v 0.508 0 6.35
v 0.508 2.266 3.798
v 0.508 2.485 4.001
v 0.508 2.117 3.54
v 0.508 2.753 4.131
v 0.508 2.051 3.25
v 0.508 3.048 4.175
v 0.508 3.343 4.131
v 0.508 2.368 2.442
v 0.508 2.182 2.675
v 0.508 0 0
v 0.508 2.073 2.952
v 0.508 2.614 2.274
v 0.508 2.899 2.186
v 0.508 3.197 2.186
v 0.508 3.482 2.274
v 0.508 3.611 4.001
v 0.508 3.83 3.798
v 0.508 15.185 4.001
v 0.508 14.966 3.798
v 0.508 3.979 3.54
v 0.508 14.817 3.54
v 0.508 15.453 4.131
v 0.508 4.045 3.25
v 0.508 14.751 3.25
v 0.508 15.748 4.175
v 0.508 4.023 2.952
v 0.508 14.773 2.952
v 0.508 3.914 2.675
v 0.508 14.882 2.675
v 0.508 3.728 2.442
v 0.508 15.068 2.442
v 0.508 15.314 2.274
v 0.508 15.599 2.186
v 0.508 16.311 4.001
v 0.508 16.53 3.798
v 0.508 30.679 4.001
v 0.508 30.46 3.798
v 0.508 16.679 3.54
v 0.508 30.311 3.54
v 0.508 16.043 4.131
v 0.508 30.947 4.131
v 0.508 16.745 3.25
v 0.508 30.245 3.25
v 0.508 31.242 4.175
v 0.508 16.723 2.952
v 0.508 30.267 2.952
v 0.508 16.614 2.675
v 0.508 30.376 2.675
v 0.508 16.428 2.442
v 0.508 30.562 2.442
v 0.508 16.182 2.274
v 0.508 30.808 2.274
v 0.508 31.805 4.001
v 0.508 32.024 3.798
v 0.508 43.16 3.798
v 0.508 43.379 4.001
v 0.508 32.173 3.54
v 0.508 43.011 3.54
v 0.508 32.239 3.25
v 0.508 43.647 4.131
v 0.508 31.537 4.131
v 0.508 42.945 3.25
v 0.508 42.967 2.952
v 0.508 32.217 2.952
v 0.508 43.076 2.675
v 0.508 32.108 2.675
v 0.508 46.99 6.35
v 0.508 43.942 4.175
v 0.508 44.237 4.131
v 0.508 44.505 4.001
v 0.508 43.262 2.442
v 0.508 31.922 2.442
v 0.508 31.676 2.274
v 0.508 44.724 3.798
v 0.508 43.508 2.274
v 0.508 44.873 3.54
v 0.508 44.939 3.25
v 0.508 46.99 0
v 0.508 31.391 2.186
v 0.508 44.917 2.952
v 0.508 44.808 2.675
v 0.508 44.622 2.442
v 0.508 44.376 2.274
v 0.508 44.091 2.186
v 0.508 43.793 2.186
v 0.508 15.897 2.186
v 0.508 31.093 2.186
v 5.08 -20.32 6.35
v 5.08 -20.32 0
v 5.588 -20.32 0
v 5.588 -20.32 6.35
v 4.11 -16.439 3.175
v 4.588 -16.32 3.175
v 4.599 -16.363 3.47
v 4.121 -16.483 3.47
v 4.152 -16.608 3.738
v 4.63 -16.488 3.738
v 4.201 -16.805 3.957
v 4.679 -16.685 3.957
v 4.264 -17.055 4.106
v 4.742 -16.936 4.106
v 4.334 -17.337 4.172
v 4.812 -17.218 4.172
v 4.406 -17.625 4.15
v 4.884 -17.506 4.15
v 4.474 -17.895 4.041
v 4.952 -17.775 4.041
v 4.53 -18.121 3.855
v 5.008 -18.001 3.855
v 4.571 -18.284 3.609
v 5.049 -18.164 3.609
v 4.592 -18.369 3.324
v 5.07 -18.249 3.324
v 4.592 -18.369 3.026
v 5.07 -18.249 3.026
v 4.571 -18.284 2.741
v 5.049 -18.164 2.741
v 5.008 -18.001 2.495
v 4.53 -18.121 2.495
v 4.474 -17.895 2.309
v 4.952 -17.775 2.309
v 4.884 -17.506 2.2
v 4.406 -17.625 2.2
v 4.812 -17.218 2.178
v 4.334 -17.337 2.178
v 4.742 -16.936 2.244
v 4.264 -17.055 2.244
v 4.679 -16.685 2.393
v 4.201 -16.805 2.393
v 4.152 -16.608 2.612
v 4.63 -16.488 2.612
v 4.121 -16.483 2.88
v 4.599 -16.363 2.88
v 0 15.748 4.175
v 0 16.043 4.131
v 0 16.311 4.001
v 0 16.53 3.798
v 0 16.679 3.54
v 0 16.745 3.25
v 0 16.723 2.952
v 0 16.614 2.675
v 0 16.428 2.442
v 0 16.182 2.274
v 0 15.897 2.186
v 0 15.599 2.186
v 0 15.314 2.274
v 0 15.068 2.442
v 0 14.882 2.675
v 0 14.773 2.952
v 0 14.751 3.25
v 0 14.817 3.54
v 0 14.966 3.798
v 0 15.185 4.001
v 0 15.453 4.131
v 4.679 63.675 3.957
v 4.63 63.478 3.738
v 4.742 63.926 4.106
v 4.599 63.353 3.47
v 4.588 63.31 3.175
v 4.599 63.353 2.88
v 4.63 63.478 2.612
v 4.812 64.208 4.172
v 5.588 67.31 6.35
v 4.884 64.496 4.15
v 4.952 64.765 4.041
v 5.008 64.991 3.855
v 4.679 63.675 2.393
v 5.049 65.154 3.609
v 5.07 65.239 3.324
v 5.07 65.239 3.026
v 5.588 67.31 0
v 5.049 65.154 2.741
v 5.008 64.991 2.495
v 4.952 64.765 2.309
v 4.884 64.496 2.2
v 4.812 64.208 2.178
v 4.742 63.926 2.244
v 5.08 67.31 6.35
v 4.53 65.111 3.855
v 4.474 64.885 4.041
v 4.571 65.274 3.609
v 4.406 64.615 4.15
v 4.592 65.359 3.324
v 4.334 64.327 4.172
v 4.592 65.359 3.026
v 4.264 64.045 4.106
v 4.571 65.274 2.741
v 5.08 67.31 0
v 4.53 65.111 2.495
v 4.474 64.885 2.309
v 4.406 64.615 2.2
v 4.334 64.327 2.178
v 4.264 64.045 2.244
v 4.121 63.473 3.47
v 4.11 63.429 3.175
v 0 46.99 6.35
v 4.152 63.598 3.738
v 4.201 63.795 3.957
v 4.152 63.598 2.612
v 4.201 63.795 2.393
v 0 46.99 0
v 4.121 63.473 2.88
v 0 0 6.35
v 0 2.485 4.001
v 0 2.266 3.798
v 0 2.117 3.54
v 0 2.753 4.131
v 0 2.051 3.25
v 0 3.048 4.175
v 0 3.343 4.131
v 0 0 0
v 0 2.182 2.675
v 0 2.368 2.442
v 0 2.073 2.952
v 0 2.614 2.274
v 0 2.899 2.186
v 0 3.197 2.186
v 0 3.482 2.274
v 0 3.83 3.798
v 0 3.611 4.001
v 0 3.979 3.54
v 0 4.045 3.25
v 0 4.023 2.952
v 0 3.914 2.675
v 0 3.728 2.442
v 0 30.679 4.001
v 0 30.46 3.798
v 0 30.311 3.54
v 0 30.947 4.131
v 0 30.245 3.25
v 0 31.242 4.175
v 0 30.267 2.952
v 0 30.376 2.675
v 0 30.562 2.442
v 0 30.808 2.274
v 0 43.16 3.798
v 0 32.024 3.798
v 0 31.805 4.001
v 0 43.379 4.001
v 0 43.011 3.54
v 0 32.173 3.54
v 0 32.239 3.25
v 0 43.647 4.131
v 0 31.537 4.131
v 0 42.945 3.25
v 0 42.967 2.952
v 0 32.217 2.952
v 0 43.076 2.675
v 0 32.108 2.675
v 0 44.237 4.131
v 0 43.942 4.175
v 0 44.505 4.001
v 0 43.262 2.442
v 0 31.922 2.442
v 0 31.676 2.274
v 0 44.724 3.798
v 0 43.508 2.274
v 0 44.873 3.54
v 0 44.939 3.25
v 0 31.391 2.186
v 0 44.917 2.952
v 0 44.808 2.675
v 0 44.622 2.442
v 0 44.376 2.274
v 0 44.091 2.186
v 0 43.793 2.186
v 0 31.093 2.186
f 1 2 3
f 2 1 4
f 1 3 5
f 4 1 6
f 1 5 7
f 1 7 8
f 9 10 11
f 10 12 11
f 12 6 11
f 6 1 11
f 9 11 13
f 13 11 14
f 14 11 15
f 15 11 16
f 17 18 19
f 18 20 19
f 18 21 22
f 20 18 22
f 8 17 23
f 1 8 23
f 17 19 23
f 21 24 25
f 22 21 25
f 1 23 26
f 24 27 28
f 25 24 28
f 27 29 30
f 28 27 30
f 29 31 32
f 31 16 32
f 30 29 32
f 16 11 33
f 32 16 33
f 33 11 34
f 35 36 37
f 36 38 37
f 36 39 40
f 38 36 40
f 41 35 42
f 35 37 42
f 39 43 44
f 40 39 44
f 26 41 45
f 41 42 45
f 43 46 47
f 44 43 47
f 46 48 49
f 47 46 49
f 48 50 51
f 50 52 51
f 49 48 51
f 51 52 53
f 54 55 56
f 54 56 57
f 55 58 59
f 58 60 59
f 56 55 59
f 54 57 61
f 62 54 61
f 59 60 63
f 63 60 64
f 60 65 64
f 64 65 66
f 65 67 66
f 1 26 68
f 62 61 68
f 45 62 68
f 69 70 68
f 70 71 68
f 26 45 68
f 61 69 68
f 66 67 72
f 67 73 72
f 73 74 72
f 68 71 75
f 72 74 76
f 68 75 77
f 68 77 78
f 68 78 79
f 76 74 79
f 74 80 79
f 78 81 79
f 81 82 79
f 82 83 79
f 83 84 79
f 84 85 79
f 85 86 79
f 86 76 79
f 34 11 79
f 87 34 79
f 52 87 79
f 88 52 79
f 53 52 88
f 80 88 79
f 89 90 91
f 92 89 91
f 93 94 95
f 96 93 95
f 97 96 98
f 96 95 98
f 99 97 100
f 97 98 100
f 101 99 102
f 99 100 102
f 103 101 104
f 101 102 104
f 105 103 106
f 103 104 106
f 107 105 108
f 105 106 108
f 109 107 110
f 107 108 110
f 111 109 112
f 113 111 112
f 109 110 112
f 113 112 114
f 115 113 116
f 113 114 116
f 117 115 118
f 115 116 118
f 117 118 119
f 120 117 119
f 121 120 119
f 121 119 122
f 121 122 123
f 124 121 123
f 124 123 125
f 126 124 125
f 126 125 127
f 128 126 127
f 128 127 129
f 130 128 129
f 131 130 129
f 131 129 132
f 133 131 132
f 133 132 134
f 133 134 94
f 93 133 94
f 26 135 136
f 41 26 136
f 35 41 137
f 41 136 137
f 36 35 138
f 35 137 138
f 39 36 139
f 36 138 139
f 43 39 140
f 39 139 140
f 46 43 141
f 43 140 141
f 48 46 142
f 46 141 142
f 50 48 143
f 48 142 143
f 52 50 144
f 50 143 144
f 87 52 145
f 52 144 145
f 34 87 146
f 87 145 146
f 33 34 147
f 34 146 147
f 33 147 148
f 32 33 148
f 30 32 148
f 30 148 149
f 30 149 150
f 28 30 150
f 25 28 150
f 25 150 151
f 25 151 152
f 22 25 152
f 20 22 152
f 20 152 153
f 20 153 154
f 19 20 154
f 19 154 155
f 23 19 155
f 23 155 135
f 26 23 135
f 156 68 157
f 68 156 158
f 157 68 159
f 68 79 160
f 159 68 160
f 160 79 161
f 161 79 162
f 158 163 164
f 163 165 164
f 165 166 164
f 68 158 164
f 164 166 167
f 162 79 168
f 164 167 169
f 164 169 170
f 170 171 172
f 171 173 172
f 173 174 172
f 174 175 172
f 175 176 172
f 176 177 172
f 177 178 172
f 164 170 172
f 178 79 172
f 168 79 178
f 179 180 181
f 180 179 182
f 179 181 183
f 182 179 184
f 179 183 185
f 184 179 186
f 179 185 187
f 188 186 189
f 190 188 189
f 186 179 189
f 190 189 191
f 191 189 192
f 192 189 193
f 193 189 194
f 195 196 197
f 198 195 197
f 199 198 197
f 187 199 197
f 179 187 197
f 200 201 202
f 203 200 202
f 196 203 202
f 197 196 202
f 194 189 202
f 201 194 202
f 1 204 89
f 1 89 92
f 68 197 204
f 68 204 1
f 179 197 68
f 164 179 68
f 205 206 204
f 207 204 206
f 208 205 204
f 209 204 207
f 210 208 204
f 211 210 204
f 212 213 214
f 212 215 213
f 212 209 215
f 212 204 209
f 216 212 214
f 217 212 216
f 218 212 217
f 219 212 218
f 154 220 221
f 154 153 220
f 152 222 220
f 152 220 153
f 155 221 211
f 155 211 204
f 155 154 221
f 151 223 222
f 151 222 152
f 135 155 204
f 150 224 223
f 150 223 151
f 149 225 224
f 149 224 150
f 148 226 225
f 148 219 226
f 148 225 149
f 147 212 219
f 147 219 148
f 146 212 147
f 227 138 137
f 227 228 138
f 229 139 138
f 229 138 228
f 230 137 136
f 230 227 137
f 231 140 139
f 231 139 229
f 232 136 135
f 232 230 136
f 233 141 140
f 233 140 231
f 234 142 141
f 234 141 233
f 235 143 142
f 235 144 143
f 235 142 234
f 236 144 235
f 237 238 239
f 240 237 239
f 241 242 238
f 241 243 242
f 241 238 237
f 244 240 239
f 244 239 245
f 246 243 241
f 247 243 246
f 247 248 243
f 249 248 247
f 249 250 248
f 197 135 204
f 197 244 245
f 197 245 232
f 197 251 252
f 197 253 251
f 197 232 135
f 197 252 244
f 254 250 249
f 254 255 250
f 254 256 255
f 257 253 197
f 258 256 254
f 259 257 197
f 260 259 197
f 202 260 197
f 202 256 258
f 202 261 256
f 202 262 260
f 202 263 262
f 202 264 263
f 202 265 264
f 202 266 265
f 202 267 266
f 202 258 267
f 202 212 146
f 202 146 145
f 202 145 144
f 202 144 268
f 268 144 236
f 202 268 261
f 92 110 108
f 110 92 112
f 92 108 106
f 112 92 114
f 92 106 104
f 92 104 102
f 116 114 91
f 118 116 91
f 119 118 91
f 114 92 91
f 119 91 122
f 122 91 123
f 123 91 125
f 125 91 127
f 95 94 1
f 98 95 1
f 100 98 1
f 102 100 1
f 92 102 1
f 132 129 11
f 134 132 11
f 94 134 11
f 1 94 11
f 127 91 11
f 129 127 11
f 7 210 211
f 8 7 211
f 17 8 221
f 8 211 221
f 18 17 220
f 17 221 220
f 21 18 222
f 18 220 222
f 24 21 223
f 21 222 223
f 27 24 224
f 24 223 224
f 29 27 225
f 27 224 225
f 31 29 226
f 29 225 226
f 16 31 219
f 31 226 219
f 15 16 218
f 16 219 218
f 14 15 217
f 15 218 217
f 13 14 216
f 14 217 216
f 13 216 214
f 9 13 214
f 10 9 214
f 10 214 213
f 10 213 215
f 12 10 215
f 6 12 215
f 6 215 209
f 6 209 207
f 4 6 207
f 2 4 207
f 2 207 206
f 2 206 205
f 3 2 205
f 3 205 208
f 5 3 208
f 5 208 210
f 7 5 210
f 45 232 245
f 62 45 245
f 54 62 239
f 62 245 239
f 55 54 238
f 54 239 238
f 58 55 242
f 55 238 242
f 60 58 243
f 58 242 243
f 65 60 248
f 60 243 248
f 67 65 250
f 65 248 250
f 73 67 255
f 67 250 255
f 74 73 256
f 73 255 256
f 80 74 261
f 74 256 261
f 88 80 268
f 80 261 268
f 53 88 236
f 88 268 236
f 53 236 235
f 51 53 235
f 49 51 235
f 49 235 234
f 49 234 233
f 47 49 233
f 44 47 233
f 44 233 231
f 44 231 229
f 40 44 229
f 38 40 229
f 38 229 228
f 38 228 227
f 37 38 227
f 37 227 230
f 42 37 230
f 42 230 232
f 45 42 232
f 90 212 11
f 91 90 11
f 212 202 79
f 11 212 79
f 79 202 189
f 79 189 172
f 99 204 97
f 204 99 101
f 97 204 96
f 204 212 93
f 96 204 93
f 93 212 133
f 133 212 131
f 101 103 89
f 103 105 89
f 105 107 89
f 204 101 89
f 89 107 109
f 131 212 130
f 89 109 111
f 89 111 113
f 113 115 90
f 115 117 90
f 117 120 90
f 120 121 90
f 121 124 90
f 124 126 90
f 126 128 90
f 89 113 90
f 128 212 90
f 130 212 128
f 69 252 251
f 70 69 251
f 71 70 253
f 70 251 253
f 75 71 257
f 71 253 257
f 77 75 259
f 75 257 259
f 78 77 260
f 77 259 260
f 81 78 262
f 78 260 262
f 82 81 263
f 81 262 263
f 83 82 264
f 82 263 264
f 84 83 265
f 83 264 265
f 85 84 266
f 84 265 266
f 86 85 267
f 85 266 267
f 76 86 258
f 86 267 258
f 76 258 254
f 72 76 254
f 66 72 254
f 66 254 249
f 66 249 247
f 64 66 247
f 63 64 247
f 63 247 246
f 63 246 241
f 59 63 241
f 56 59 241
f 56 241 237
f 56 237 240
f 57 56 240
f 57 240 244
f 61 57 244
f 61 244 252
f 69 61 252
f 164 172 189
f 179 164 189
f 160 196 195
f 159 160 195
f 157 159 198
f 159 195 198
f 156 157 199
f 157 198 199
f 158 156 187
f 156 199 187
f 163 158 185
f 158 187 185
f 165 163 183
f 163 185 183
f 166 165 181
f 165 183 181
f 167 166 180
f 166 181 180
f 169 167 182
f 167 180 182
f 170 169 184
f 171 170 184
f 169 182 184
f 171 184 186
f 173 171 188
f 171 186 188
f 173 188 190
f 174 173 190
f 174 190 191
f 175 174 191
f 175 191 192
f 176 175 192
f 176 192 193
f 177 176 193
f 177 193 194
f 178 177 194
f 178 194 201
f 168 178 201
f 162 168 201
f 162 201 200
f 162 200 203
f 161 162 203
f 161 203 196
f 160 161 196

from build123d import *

# Parameters (mm, degrees)
SKETCH1_W           = 0.508
SKETCH1_H           = 46.99
BOSS_EXTRUDE1_DEPTH = 6.35
SKETCH2_R           = 1
CUT_EXTRUDE1_DEPTH  = 6.35
SKETCH3_R           = 1
CUT_EXTRUDE2_DEPTH  = 6.35
SKETCH4_R           = 1
CUT_EXTRUDE3_DEPTH  = 2.54


with BuildPart() as part:
    # Sketch1 → Boss-Extrude1 (new body)
    with BuildSketch(Plane.XY):
        with Locations((0.254, 23.495)):
            Rectangle(SKETCH1_W, SKETCH1_H)
        Polygon((0, 46.99), (0.508, 46.99), (5.588, 67.31), (5.08, 67.31), align=None)
        Polygon((5.588, -20.32), (0.508, 0), (0, 0), (5.08, -20.32), align=None)
    extrude(amount=BOSS_EXTRUDE1_DEPTH)

    # Sketch2 → Cut-Extrude1 (cut)
    with BuildSketch(Plane.ZY):
        with Locations((3.175, 3.048)):
            Circle(SKETCH2_R)
        with Locations((3.175, 15.748)):
            Circle(SKETCH2_R)
        with Locations((3.175, 43.942)):
            Circle(SKETCH2_R)
        with Locations((3.175, 31.242)):
            Circle(SKETCH2_R)
    extrude(amount=-CUT_EXTRUDE1_DEPTH, mode=Mode.SUBTRACT)

    # Sketch3 → Cut-Extrude2 (cut)
    with BuildSketch(Plane(origin=(-11.056470588, 2.764117647, 0), x_dir=(0, 0, 1), z_dir=(-0.9701425001453319, 0.24253562503633325, 0))):
        with Locations(Location((3.175, 63.53237266, 0), (0, 0, 270))):
            Circle(SKETCH3_R)
    extrude(amount=-CUT_EXTRUDE2_DEPTH, mode=Mode.SUBTRACT)

    # Sketch4 → Cut-Extrude3 (cut)
    with BuildSketch(Plane(origin=(0.478117647, 0.119529412, 0), x_dir=(0, 0, -1), z_dir=(0.9701425001453319, 0.24253562503633308, 0))):
        with Locations(Location((-3.175, -17.945376578, 0), (0, 0, 90))):
            Circle(SKETCH4_R)
    extrude(amount=-CUT_EXTRUDE3_DEPTH, mode=Mode.SUBTRACT)


solid = part.part
